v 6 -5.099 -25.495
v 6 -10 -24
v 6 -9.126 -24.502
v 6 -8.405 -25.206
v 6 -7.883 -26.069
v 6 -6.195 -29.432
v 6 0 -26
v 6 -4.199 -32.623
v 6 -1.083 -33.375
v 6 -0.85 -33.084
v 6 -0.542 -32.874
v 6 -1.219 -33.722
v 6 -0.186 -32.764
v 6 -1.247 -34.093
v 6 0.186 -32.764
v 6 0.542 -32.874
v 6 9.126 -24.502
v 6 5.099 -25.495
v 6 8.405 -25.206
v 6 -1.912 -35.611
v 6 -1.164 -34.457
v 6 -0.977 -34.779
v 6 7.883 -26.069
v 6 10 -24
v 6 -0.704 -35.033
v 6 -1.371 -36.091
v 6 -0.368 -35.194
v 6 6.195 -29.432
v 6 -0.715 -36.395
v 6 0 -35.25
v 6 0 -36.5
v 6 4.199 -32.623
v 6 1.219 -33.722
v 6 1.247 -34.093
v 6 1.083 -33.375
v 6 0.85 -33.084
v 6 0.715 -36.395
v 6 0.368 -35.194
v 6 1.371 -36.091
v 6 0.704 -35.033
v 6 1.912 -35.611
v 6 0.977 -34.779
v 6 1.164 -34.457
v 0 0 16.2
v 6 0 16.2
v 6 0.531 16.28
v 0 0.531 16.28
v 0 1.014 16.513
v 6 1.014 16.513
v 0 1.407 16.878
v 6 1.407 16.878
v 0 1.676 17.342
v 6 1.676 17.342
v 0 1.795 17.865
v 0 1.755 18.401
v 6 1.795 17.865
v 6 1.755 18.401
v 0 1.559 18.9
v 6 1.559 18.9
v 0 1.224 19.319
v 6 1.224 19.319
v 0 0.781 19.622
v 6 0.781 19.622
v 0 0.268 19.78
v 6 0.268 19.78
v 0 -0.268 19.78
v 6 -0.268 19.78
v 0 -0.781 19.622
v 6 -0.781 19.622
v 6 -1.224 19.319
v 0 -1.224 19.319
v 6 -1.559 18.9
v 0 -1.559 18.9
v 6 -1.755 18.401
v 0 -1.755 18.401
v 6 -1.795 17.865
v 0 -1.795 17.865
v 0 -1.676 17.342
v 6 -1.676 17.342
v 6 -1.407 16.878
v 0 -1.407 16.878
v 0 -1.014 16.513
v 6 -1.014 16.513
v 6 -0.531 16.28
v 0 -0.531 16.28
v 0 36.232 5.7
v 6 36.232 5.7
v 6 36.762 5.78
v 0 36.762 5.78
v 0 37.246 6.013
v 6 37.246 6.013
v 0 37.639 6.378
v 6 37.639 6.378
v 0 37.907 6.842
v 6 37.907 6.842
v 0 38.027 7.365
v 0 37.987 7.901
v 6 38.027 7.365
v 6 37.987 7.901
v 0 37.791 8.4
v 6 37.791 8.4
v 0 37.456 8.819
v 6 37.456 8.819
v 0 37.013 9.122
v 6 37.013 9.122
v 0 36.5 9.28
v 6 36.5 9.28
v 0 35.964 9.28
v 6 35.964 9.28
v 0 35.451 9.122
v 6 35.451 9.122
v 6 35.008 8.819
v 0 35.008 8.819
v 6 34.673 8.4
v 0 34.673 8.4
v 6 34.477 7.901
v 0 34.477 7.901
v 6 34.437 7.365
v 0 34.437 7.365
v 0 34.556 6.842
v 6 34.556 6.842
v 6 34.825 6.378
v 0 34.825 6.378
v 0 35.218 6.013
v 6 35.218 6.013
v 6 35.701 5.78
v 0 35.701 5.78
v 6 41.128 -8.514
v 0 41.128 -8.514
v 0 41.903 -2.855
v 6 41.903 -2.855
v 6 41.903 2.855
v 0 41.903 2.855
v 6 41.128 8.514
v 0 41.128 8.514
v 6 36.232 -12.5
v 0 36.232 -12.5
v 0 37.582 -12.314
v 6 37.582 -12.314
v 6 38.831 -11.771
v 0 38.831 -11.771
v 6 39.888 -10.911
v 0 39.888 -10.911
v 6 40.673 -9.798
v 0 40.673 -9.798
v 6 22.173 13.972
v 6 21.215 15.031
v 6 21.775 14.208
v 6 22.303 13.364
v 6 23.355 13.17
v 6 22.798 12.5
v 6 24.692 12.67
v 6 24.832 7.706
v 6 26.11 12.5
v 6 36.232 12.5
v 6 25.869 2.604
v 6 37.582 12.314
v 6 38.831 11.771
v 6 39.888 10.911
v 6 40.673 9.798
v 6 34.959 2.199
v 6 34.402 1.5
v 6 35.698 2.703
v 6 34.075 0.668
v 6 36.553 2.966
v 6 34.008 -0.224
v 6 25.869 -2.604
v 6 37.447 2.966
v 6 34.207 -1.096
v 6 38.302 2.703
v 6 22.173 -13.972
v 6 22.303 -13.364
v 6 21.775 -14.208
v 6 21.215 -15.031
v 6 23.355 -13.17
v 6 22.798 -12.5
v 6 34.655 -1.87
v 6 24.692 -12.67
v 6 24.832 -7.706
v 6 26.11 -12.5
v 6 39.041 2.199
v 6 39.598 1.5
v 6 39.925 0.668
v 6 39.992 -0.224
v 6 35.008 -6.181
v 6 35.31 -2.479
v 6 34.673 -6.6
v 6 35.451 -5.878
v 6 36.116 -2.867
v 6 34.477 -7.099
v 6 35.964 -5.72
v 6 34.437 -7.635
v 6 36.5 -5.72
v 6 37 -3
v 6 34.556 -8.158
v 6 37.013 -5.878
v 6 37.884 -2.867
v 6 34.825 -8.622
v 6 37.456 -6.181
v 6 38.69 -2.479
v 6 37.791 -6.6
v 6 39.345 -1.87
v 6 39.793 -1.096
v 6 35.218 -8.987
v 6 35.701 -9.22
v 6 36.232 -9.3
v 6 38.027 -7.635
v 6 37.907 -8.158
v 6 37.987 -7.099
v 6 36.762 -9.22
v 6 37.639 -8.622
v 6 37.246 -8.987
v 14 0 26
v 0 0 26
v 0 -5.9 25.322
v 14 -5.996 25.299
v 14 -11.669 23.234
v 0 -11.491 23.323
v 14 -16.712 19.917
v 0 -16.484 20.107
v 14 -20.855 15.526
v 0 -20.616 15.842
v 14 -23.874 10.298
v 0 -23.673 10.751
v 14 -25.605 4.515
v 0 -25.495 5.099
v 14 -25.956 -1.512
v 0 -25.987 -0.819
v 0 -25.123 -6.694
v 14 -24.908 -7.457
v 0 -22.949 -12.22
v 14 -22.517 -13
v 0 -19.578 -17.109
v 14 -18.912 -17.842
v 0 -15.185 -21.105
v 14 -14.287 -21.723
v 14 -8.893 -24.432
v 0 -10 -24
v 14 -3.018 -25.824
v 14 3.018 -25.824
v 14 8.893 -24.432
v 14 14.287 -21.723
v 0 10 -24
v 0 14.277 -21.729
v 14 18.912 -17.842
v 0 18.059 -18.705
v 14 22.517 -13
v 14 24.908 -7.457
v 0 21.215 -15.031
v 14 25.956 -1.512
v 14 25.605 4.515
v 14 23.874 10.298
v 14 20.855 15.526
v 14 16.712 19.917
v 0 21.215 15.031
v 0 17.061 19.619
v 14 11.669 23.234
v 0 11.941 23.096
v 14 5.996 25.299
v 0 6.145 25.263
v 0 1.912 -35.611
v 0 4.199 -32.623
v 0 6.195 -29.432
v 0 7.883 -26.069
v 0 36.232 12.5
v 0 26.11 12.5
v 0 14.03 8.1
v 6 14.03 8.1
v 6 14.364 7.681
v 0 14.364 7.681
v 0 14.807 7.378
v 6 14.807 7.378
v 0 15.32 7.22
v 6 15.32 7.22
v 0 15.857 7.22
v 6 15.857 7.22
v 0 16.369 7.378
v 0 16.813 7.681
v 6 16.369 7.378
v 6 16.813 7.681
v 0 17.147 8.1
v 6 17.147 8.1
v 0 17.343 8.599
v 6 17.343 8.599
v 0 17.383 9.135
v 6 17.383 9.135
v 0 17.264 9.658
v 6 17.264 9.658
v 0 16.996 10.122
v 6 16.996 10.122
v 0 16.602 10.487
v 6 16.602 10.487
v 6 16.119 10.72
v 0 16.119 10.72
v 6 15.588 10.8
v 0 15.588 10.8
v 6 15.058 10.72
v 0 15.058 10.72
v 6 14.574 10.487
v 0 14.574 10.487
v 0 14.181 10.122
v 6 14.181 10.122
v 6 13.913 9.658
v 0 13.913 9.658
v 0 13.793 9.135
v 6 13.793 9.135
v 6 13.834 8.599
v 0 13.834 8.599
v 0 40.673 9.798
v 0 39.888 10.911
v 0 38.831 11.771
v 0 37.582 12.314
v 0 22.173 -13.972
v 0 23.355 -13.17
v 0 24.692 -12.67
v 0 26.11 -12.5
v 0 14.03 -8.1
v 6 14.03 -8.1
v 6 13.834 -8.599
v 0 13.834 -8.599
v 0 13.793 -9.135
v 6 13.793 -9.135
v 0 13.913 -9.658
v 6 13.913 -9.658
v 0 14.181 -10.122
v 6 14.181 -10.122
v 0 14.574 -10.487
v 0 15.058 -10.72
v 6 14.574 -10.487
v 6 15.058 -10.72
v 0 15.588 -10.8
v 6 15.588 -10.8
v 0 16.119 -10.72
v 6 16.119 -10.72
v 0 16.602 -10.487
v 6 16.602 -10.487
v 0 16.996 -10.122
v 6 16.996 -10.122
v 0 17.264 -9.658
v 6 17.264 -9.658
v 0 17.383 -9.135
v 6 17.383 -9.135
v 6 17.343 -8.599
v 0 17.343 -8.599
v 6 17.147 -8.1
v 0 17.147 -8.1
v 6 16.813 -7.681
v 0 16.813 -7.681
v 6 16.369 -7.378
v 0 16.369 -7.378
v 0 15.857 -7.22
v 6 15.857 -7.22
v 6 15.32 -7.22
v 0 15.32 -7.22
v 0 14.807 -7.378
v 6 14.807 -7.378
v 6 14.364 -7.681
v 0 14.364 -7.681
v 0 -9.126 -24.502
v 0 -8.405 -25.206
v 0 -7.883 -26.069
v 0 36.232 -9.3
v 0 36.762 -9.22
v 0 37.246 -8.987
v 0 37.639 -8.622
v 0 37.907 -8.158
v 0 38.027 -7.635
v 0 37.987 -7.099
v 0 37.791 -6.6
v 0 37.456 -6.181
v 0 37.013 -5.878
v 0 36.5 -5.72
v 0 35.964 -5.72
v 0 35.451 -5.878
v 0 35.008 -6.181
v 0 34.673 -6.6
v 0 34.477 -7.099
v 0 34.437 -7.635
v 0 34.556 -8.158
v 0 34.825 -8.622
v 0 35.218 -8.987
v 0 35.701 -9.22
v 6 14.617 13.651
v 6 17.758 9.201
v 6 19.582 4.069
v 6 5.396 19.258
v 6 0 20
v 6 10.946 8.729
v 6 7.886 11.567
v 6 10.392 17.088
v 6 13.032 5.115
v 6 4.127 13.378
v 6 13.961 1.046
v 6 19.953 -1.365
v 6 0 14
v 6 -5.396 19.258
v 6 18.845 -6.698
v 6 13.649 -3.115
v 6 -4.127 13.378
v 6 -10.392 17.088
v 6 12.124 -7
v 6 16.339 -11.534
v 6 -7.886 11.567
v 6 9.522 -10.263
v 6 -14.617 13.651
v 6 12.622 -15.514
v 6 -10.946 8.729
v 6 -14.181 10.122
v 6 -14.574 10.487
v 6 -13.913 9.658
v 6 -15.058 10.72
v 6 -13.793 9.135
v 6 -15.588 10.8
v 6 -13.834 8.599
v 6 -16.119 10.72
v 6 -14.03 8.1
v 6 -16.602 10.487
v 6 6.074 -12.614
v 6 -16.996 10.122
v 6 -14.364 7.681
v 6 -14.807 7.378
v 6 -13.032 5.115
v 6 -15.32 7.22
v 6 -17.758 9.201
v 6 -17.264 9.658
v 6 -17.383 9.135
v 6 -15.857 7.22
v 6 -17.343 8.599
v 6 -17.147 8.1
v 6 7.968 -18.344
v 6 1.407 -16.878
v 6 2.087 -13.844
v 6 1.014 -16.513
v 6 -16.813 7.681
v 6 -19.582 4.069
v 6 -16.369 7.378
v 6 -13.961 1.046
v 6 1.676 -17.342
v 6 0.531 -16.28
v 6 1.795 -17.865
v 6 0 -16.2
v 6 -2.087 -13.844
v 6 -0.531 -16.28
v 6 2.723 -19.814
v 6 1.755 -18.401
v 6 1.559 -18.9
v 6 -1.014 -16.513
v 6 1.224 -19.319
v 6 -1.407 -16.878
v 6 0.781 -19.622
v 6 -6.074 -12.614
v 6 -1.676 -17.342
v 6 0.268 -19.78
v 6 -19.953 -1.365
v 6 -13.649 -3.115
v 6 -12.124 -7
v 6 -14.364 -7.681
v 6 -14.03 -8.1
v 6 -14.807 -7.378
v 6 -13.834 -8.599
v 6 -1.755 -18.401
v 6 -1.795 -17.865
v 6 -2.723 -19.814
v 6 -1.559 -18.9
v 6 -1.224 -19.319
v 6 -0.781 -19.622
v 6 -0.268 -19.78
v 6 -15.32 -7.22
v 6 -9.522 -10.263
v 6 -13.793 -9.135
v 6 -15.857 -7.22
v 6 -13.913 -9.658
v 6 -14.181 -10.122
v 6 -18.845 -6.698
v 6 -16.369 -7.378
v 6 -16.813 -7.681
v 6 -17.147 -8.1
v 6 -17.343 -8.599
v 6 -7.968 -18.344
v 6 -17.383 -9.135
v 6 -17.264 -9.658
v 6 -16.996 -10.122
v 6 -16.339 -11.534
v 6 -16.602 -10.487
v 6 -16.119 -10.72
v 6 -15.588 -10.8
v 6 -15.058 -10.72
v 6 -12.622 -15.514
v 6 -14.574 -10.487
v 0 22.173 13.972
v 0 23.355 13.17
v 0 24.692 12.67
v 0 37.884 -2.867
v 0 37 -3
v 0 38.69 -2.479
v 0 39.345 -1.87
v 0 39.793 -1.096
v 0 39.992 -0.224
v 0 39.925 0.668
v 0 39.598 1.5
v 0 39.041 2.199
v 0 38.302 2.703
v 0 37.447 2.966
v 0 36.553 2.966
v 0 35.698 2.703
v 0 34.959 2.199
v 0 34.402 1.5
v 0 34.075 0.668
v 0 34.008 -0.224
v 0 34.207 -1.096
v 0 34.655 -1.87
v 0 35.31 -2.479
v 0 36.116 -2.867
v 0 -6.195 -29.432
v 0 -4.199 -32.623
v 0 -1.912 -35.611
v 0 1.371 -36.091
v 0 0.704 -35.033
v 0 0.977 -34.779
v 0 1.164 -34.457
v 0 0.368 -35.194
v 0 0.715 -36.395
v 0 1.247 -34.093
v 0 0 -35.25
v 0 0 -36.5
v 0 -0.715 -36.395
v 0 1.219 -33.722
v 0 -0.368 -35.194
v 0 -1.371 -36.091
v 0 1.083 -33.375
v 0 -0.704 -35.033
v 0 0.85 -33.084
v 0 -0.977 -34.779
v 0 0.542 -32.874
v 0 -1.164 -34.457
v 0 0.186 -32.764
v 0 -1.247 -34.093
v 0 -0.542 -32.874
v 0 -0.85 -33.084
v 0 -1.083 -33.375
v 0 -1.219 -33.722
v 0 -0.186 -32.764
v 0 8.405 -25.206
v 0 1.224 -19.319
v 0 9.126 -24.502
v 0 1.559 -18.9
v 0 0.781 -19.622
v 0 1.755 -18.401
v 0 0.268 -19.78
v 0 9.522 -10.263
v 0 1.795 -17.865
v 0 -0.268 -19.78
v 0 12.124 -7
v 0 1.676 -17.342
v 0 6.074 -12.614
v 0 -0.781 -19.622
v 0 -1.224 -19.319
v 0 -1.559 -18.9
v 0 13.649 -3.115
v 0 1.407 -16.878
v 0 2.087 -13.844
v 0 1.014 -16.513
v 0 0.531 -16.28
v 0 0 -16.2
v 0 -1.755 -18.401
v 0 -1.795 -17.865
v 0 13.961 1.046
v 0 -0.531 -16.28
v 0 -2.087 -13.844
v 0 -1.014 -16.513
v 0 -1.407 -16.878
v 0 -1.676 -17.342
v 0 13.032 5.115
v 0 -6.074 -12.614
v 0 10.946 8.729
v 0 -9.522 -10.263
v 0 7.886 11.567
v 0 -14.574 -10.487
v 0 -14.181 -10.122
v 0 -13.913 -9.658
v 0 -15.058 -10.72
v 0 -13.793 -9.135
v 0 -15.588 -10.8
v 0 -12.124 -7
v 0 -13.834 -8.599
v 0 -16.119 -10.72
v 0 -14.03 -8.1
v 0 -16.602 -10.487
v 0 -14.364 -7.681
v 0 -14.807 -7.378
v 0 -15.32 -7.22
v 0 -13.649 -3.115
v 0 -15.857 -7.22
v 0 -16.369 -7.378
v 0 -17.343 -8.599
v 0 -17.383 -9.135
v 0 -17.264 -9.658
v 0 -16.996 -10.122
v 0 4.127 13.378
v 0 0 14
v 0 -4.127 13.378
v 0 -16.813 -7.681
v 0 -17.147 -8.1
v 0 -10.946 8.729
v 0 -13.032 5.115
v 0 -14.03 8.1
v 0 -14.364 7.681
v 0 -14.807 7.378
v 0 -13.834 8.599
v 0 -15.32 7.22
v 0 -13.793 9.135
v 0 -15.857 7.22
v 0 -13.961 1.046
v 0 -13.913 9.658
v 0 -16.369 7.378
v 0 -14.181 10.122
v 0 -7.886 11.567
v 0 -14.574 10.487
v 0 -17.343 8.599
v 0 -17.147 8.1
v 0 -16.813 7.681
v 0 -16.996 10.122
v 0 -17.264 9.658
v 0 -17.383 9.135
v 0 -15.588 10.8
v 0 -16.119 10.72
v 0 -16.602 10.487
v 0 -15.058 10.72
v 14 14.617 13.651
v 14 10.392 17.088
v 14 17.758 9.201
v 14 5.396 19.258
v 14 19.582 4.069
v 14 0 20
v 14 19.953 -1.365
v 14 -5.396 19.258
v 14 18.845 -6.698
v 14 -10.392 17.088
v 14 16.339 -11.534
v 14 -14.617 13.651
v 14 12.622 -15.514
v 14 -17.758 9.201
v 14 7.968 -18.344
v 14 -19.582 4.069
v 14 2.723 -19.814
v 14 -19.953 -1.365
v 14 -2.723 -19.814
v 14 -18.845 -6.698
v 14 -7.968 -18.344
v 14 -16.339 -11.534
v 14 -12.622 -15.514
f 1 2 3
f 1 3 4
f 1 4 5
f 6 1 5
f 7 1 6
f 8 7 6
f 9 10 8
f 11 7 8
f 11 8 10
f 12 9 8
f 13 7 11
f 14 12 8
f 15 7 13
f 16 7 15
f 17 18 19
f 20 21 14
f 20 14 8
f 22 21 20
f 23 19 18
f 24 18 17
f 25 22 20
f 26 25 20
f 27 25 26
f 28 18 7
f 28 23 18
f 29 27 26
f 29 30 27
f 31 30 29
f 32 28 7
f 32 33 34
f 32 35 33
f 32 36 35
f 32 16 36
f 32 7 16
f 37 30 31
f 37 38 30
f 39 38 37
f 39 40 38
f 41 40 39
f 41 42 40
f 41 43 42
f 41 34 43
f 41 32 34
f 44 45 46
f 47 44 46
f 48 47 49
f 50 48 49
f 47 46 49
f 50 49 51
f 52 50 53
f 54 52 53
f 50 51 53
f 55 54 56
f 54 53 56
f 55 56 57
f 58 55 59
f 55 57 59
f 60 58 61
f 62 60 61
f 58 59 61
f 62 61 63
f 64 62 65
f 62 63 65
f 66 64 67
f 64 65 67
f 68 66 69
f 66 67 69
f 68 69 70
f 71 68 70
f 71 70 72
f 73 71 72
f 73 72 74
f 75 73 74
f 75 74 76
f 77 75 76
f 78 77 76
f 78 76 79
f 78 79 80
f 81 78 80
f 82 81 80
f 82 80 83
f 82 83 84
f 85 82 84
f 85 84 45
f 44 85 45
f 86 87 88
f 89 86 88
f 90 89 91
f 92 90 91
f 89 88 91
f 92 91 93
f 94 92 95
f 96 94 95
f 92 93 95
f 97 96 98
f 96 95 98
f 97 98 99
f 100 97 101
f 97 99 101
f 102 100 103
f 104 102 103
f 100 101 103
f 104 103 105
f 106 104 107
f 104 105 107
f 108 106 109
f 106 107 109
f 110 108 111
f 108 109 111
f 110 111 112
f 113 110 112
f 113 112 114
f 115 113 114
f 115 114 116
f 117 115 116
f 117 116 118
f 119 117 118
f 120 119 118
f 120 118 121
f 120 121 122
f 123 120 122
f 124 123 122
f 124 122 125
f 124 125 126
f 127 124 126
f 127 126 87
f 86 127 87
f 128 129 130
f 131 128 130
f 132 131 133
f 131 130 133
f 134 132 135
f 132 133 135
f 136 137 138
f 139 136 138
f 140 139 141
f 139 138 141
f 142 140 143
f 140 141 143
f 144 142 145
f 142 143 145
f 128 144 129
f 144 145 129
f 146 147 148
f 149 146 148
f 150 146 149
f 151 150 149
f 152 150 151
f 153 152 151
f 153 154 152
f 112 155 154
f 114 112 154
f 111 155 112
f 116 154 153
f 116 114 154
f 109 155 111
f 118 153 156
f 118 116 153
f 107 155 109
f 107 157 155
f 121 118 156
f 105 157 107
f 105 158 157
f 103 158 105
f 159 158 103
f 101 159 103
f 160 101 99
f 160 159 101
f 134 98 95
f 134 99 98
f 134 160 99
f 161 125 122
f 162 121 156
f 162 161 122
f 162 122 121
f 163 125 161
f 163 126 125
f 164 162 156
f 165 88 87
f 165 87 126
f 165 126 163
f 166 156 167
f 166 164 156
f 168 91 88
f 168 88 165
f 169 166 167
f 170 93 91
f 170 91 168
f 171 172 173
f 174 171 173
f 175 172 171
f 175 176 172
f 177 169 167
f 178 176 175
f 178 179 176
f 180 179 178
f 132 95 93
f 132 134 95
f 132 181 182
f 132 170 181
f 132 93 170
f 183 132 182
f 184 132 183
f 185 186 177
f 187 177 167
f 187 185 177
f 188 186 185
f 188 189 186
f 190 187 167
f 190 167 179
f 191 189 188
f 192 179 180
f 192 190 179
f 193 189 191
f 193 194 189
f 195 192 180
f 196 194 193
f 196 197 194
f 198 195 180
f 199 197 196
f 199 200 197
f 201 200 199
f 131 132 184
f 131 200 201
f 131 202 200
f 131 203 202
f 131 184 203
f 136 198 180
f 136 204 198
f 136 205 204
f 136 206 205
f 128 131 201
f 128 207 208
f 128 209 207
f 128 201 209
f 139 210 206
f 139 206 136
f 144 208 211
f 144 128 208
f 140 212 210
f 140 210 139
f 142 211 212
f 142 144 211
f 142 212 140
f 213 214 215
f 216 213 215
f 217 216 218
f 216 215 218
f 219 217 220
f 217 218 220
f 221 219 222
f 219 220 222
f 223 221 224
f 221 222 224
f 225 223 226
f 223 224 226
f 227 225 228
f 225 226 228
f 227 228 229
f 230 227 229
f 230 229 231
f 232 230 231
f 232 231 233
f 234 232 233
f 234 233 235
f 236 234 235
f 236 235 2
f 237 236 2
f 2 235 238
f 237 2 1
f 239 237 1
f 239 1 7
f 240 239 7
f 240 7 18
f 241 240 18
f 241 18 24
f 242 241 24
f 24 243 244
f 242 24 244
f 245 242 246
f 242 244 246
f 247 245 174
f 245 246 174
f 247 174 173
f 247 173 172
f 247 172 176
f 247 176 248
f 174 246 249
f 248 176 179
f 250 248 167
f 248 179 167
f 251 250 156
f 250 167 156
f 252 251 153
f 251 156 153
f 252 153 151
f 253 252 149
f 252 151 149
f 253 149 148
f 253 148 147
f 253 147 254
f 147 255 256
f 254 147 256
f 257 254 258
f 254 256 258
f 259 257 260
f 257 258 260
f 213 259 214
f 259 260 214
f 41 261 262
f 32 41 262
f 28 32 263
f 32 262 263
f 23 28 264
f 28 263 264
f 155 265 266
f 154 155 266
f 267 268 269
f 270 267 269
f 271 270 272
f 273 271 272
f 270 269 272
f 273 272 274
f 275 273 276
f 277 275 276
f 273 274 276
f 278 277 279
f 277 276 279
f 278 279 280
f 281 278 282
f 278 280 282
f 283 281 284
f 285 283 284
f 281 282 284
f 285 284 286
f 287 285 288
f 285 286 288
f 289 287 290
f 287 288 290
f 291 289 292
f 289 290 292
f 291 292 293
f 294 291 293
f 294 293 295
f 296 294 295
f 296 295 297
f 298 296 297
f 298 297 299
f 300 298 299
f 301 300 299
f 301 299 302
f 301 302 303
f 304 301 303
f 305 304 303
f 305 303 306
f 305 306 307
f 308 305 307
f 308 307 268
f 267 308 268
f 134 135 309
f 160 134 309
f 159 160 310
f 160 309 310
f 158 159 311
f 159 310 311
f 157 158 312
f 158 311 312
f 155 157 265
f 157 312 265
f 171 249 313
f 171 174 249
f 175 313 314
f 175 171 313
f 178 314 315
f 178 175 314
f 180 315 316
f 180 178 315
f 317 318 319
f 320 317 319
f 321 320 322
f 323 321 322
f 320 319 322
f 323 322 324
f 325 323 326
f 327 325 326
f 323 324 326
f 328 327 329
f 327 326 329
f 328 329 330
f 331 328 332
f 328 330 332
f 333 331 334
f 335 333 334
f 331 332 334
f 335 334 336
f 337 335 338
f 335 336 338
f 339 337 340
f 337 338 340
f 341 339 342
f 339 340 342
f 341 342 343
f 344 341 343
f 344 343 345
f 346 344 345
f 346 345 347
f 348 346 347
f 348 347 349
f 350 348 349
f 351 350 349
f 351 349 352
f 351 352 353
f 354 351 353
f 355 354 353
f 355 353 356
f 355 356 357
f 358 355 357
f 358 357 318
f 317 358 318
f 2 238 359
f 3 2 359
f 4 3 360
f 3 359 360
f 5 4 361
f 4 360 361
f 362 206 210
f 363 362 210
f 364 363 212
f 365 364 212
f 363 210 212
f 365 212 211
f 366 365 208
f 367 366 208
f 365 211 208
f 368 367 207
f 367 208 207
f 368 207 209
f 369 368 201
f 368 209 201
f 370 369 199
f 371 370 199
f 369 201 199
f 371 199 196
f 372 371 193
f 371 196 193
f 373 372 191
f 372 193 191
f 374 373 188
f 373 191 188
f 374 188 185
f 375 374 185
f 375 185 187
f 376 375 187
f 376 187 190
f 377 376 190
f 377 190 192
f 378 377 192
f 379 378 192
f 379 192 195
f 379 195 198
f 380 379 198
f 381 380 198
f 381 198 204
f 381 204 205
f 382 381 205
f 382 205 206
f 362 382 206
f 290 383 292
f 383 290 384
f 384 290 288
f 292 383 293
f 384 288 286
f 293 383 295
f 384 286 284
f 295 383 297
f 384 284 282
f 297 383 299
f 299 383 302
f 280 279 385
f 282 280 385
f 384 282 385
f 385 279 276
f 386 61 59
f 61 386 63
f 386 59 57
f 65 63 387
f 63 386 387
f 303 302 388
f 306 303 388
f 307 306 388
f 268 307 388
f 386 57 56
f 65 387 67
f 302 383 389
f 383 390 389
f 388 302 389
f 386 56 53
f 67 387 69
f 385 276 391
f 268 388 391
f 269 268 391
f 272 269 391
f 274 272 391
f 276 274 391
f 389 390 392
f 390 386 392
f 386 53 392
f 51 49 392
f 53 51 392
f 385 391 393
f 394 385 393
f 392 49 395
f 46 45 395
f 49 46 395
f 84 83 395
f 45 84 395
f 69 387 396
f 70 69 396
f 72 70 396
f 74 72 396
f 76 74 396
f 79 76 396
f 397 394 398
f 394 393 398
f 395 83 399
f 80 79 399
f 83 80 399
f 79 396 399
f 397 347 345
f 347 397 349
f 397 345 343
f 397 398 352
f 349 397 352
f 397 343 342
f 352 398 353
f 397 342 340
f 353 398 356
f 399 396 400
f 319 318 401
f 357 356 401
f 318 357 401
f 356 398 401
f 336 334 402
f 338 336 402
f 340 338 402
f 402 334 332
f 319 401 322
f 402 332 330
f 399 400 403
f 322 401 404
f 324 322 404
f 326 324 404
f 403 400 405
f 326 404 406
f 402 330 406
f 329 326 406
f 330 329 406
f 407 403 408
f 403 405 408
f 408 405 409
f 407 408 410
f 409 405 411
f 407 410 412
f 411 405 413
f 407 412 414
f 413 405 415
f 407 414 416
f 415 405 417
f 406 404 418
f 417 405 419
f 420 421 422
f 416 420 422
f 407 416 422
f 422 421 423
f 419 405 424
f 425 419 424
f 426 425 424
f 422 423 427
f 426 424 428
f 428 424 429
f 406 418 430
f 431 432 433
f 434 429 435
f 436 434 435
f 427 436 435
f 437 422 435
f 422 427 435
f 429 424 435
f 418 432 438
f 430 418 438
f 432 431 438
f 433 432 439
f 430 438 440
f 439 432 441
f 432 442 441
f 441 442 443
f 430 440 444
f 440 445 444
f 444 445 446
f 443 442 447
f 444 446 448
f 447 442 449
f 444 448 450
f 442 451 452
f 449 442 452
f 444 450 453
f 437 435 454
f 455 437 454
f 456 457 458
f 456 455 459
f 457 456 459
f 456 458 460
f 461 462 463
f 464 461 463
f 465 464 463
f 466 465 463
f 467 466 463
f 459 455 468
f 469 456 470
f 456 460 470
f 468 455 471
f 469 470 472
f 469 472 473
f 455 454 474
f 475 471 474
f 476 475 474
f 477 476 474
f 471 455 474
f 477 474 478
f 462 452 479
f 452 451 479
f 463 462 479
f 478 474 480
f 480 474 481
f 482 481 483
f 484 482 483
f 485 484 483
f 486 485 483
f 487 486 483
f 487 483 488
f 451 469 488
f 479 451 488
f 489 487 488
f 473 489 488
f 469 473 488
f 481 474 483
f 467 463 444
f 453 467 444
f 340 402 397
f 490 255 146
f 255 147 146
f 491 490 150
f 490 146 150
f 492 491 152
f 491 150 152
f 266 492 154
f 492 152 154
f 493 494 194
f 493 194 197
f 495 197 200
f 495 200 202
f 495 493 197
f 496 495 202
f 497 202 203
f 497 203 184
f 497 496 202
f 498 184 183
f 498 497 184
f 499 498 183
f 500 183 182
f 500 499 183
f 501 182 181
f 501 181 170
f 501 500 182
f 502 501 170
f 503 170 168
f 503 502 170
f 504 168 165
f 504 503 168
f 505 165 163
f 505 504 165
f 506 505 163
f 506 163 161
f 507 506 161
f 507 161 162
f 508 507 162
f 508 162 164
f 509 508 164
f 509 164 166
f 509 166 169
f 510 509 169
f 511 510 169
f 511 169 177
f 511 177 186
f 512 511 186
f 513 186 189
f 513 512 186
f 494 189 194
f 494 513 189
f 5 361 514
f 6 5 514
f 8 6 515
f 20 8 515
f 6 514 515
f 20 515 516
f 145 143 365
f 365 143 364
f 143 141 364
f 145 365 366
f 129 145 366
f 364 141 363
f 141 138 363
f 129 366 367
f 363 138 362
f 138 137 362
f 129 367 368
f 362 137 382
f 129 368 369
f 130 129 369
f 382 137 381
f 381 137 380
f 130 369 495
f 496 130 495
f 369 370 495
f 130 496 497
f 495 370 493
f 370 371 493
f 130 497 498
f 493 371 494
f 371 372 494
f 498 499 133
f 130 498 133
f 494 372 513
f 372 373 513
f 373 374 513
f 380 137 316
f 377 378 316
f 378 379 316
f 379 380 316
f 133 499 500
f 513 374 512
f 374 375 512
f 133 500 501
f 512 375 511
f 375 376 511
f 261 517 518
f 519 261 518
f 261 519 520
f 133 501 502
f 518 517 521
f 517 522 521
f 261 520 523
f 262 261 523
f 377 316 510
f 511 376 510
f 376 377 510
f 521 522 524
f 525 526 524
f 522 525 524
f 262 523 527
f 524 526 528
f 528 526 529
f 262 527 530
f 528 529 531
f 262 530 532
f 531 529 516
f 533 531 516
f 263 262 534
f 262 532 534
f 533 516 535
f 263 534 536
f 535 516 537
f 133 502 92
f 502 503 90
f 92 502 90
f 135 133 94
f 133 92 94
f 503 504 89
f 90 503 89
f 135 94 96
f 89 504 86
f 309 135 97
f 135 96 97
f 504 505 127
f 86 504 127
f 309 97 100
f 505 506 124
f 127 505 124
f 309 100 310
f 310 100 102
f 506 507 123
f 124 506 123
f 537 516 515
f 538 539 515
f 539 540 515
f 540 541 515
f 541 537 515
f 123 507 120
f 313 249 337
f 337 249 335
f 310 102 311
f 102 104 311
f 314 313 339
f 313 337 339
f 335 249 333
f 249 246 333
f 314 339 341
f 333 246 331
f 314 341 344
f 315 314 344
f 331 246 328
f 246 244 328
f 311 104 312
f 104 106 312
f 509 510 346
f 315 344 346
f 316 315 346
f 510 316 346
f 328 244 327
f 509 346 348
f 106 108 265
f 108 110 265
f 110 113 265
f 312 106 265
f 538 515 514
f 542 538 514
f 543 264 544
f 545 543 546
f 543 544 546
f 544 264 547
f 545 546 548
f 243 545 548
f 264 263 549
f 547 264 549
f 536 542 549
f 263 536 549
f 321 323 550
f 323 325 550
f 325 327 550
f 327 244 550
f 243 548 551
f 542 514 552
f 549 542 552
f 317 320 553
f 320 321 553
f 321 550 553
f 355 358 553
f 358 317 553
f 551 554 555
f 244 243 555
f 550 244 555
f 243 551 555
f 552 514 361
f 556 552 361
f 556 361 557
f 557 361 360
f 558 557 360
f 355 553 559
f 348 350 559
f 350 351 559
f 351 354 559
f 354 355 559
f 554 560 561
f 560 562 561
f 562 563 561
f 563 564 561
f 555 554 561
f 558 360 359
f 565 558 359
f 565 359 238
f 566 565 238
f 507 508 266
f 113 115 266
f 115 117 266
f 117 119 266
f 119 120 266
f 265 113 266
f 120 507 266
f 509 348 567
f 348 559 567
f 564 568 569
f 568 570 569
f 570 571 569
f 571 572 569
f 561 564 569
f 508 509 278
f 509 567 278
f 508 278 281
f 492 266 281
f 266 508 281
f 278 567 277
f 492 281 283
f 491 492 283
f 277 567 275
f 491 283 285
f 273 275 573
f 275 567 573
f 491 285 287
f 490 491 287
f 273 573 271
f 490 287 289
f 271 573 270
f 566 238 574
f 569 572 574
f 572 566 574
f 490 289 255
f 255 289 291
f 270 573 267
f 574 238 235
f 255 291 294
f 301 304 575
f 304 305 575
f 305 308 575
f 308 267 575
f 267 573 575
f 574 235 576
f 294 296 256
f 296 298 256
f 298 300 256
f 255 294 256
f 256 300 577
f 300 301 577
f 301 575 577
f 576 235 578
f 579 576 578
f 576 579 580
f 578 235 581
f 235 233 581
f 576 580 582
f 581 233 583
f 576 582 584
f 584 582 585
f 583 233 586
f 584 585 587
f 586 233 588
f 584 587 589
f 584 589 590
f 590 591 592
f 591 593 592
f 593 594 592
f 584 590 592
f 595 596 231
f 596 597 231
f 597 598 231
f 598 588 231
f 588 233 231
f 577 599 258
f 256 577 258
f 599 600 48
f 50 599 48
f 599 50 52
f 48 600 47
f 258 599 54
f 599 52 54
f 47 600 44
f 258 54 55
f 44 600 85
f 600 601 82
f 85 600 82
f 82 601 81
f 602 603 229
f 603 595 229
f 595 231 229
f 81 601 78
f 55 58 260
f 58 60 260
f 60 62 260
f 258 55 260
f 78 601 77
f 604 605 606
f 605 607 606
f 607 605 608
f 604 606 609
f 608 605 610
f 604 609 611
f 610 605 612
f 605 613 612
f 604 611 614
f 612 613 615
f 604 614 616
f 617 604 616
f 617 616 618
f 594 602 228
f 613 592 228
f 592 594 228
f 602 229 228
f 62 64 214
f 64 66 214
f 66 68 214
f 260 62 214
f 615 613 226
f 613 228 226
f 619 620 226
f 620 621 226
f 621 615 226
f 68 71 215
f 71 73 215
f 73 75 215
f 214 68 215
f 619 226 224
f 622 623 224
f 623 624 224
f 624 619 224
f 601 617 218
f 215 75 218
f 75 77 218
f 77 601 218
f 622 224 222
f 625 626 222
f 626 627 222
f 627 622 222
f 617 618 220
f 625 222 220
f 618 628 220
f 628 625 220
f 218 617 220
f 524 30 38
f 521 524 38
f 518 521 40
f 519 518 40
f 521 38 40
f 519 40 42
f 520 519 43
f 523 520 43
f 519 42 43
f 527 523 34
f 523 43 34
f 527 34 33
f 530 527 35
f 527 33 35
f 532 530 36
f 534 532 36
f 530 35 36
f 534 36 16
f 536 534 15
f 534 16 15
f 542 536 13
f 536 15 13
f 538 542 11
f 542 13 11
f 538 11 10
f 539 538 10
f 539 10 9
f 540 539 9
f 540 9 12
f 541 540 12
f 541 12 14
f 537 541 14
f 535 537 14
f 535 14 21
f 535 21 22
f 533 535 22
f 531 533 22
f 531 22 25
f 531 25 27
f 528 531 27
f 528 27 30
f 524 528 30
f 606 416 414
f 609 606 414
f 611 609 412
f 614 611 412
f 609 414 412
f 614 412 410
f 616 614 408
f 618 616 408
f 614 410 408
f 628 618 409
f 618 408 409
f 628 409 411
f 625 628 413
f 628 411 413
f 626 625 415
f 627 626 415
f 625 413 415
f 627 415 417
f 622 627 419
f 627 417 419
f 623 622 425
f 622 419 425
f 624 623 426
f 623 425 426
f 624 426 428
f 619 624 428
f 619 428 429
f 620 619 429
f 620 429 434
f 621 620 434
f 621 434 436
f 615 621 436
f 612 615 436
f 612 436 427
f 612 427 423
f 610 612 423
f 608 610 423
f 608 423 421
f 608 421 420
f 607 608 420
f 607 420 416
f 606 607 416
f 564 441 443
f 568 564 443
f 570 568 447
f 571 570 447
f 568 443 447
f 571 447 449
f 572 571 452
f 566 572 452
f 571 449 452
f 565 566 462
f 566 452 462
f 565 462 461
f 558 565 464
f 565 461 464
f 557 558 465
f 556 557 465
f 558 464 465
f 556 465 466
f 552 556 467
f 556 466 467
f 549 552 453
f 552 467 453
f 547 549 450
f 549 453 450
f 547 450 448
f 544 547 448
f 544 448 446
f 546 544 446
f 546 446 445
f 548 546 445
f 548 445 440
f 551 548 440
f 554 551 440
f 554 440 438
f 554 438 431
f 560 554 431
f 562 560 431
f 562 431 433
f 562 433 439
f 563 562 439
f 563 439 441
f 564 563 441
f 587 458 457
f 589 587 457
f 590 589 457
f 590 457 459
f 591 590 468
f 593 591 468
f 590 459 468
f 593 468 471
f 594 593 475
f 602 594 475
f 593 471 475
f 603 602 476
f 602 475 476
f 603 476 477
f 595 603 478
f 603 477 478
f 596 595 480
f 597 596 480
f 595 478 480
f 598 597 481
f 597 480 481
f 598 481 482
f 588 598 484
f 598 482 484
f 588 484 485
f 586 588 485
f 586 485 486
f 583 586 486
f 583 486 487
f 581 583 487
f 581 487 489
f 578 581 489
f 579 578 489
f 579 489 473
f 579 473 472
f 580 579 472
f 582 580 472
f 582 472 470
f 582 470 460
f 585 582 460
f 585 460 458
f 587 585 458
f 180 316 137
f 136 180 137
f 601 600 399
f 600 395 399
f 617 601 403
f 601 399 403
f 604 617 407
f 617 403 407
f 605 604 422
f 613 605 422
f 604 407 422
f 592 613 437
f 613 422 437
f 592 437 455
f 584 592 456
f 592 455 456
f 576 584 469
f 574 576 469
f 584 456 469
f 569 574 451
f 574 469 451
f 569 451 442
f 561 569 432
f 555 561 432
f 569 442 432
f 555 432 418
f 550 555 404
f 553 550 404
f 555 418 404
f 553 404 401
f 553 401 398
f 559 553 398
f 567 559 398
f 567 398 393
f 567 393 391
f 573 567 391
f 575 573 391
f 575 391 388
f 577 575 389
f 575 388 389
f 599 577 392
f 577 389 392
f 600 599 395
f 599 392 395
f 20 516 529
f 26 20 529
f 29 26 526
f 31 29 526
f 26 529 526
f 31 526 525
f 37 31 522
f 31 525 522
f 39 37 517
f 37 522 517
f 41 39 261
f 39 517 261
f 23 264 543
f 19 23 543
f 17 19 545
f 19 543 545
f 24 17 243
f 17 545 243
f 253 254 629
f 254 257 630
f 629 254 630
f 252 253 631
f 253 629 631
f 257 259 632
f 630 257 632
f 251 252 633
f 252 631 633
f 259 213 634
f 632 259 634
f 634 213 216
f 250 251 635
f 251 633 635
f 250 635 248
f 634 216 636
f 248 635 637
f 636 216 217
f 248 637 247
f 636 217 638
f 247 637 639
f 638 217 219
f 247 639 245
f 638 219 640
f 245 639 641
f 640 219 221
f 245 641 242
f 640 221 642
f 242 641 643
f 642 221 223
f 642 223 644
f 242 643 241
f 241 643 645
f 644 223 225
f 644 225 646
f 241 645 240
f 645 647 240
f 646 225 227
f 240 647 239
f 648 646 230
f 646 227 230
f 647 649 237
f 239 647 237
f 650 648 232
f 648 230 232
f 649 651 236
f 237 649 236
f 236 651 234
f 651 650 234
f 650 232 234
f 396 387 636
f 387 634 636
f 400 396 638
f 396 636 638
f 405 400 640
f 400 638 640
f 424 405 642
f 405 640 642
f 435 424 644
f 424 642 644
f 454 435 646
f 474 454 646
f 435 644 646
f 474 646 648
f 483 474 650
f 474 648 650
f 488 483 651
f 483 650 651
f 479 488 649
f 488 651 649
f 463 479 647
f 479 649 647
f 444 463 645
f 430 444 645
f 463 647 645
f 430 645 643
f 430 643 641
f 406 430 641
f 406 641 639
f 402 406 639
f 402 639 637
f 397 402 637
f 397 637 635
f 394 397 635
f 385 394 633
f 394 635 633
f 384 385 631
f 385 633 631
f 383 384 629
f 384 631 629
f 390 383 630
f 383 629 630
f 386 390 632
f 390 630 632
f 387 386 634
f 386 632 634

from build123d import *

# Parameters (mm, degrees)
BOSS_EXTRUDE2_DEPTH   = 6
M3_CLEARANCE_HOLE1_D  = 2.5
SKETCH14_R            = 3
BOSS_EXTRUDE4_DEPTH   = 6
M3_CLEARANCE_HOLE2_D  = 3.6
CIRPATTERN1_COUNT     = 6
FILLET1_R             = 6
M3X0_5_TAPPED_HOLE1_D = 3.6


with BuildPart() as part:
    # Sketch1 → Revolve1 (revolve)
    with BuildSketch(Plane.XY, mode=Mode.PRIVATE) as revolve1_sk:
        Polygon((0, 14), (6, 14), (6, 20), (14, 20), (14, 26), (0, 26), align=None)
    revolve(revolve1_sk.sketch.rotate(Axis((-2.257208118, 0, 0), (1, 0, 0)), 90), axis=Axis((-2.257208118, 0, 0), (1, 0, 0)))

    # Sketch3 → Boss-Extrude2 (add)
    with BuildSketch(Plane(origin=(0, 0, 0), x_dir=(0, 0, -1), z_dir=(1, 0, 0))):
        with BuildLine():
            ThreePointArc((24, -10), (24.831302178, -8.742992446), (26.068711806, -7.882789726))
            ThreePointArc((26.068711806, -7.882789726), (31.05103074, -5.234546759), (35.611149804, -1.911595226))
            ThreePointArc((35.611149804, -1.911595226), (36.5, 0), (35.611149804, 1.911595226))
            ThreePointArc((35.611149804, 1.911595226), (31.05103074, 5.234546759), (26.068711806, 7.882789726))
            ThreePointArc((26.068711806, 7.882789726), (24.831302178, 8.742992446), (24, 10))
            ThreePointArc((24, 10), (26, 0), (24, -10))
        make_face()
    extrude(amount=BOSS_EXTRUDE2_DEPTH)

    # M3 Clearance Hole1 (through all)
    with Locations(Plane.ZY):
        with Locations((-34, 0)):
            Hole(M3_CLEARANCE_HOLE1_D / 2)

    # Sketch14 → Boss-Extrude4 (add)
    with BuildSketch(Plane(origin=(0, 0, 0), x_dir=(0, 0, -1), z_dir=(1, 0, 0))):
        with BuildLine():
            Line((-12.5, 36.231892029), (-12.5, 22.79802623))
            ThreePointArc((-12.5, 22.79802623), (0, 26), (12.5, 22.79802623))
            Line((12.5, 22.79802623), (12.5, 36.231892029))
            ThreePointArc((12.5, 36.231892029), (11.377342361, 39.388823485), (8.513513514, 41.128093655))
            ThreePointArc((8.513513514, 41.128093655), (0, 42), (-8.513513514, 41.128093655))
            ThreePointArc((-8.513513514, 41.128093655), (-11.377342361, 39.388823485), (-12.5, 36.231892029))
        make_face()
        with Locations((0, 37)):
            Circle(SKETCH14_R, mode=Mode.SUBTRACT)
    extrude(amount=BOSS_EXTRUDE4_DEPTH)

    # M3 Clearance Hole2 (through all)
    with Locations(Plane.ZY):
        with Locations((18, 0)):
            m3_clearance_hole2 = Hole(M3_CLEARANCE_HOLE2_D / 2)

    # CirPattern1: M3 Clearance Hole2 ×6 about axis
    cirpattern1_axis = Axis((0, 0, 0), (1, 0, 0))
    for i in range(1, CIRPATTERN1_COUNT):
        add(m3_clearance_hole2.rotate(cirpattern1_axis, i * 360 / CIRPATTERN1_COUNT), mode=Mode.SUBTRACT)

    # Fillet1
    fillet1_edges = [part.edges().sort_by_distance(p)[0] for p in [
        (3, 22.79802623, 12.5),
        (3, 22.79802623, -12.5),
    ]]
    fillet(fillet1_edges, radius=FILLET1_R)

    # M3x0.5 Tapped Hole1 (through all)
    with Locations(Plane.ZY):
        with Locations((7.5, 36.231892029), (-7.5, 36.231892029)):
            Hole(M3X0_5_TAPPED_HOLE1_D / 2)


solid = part.part
